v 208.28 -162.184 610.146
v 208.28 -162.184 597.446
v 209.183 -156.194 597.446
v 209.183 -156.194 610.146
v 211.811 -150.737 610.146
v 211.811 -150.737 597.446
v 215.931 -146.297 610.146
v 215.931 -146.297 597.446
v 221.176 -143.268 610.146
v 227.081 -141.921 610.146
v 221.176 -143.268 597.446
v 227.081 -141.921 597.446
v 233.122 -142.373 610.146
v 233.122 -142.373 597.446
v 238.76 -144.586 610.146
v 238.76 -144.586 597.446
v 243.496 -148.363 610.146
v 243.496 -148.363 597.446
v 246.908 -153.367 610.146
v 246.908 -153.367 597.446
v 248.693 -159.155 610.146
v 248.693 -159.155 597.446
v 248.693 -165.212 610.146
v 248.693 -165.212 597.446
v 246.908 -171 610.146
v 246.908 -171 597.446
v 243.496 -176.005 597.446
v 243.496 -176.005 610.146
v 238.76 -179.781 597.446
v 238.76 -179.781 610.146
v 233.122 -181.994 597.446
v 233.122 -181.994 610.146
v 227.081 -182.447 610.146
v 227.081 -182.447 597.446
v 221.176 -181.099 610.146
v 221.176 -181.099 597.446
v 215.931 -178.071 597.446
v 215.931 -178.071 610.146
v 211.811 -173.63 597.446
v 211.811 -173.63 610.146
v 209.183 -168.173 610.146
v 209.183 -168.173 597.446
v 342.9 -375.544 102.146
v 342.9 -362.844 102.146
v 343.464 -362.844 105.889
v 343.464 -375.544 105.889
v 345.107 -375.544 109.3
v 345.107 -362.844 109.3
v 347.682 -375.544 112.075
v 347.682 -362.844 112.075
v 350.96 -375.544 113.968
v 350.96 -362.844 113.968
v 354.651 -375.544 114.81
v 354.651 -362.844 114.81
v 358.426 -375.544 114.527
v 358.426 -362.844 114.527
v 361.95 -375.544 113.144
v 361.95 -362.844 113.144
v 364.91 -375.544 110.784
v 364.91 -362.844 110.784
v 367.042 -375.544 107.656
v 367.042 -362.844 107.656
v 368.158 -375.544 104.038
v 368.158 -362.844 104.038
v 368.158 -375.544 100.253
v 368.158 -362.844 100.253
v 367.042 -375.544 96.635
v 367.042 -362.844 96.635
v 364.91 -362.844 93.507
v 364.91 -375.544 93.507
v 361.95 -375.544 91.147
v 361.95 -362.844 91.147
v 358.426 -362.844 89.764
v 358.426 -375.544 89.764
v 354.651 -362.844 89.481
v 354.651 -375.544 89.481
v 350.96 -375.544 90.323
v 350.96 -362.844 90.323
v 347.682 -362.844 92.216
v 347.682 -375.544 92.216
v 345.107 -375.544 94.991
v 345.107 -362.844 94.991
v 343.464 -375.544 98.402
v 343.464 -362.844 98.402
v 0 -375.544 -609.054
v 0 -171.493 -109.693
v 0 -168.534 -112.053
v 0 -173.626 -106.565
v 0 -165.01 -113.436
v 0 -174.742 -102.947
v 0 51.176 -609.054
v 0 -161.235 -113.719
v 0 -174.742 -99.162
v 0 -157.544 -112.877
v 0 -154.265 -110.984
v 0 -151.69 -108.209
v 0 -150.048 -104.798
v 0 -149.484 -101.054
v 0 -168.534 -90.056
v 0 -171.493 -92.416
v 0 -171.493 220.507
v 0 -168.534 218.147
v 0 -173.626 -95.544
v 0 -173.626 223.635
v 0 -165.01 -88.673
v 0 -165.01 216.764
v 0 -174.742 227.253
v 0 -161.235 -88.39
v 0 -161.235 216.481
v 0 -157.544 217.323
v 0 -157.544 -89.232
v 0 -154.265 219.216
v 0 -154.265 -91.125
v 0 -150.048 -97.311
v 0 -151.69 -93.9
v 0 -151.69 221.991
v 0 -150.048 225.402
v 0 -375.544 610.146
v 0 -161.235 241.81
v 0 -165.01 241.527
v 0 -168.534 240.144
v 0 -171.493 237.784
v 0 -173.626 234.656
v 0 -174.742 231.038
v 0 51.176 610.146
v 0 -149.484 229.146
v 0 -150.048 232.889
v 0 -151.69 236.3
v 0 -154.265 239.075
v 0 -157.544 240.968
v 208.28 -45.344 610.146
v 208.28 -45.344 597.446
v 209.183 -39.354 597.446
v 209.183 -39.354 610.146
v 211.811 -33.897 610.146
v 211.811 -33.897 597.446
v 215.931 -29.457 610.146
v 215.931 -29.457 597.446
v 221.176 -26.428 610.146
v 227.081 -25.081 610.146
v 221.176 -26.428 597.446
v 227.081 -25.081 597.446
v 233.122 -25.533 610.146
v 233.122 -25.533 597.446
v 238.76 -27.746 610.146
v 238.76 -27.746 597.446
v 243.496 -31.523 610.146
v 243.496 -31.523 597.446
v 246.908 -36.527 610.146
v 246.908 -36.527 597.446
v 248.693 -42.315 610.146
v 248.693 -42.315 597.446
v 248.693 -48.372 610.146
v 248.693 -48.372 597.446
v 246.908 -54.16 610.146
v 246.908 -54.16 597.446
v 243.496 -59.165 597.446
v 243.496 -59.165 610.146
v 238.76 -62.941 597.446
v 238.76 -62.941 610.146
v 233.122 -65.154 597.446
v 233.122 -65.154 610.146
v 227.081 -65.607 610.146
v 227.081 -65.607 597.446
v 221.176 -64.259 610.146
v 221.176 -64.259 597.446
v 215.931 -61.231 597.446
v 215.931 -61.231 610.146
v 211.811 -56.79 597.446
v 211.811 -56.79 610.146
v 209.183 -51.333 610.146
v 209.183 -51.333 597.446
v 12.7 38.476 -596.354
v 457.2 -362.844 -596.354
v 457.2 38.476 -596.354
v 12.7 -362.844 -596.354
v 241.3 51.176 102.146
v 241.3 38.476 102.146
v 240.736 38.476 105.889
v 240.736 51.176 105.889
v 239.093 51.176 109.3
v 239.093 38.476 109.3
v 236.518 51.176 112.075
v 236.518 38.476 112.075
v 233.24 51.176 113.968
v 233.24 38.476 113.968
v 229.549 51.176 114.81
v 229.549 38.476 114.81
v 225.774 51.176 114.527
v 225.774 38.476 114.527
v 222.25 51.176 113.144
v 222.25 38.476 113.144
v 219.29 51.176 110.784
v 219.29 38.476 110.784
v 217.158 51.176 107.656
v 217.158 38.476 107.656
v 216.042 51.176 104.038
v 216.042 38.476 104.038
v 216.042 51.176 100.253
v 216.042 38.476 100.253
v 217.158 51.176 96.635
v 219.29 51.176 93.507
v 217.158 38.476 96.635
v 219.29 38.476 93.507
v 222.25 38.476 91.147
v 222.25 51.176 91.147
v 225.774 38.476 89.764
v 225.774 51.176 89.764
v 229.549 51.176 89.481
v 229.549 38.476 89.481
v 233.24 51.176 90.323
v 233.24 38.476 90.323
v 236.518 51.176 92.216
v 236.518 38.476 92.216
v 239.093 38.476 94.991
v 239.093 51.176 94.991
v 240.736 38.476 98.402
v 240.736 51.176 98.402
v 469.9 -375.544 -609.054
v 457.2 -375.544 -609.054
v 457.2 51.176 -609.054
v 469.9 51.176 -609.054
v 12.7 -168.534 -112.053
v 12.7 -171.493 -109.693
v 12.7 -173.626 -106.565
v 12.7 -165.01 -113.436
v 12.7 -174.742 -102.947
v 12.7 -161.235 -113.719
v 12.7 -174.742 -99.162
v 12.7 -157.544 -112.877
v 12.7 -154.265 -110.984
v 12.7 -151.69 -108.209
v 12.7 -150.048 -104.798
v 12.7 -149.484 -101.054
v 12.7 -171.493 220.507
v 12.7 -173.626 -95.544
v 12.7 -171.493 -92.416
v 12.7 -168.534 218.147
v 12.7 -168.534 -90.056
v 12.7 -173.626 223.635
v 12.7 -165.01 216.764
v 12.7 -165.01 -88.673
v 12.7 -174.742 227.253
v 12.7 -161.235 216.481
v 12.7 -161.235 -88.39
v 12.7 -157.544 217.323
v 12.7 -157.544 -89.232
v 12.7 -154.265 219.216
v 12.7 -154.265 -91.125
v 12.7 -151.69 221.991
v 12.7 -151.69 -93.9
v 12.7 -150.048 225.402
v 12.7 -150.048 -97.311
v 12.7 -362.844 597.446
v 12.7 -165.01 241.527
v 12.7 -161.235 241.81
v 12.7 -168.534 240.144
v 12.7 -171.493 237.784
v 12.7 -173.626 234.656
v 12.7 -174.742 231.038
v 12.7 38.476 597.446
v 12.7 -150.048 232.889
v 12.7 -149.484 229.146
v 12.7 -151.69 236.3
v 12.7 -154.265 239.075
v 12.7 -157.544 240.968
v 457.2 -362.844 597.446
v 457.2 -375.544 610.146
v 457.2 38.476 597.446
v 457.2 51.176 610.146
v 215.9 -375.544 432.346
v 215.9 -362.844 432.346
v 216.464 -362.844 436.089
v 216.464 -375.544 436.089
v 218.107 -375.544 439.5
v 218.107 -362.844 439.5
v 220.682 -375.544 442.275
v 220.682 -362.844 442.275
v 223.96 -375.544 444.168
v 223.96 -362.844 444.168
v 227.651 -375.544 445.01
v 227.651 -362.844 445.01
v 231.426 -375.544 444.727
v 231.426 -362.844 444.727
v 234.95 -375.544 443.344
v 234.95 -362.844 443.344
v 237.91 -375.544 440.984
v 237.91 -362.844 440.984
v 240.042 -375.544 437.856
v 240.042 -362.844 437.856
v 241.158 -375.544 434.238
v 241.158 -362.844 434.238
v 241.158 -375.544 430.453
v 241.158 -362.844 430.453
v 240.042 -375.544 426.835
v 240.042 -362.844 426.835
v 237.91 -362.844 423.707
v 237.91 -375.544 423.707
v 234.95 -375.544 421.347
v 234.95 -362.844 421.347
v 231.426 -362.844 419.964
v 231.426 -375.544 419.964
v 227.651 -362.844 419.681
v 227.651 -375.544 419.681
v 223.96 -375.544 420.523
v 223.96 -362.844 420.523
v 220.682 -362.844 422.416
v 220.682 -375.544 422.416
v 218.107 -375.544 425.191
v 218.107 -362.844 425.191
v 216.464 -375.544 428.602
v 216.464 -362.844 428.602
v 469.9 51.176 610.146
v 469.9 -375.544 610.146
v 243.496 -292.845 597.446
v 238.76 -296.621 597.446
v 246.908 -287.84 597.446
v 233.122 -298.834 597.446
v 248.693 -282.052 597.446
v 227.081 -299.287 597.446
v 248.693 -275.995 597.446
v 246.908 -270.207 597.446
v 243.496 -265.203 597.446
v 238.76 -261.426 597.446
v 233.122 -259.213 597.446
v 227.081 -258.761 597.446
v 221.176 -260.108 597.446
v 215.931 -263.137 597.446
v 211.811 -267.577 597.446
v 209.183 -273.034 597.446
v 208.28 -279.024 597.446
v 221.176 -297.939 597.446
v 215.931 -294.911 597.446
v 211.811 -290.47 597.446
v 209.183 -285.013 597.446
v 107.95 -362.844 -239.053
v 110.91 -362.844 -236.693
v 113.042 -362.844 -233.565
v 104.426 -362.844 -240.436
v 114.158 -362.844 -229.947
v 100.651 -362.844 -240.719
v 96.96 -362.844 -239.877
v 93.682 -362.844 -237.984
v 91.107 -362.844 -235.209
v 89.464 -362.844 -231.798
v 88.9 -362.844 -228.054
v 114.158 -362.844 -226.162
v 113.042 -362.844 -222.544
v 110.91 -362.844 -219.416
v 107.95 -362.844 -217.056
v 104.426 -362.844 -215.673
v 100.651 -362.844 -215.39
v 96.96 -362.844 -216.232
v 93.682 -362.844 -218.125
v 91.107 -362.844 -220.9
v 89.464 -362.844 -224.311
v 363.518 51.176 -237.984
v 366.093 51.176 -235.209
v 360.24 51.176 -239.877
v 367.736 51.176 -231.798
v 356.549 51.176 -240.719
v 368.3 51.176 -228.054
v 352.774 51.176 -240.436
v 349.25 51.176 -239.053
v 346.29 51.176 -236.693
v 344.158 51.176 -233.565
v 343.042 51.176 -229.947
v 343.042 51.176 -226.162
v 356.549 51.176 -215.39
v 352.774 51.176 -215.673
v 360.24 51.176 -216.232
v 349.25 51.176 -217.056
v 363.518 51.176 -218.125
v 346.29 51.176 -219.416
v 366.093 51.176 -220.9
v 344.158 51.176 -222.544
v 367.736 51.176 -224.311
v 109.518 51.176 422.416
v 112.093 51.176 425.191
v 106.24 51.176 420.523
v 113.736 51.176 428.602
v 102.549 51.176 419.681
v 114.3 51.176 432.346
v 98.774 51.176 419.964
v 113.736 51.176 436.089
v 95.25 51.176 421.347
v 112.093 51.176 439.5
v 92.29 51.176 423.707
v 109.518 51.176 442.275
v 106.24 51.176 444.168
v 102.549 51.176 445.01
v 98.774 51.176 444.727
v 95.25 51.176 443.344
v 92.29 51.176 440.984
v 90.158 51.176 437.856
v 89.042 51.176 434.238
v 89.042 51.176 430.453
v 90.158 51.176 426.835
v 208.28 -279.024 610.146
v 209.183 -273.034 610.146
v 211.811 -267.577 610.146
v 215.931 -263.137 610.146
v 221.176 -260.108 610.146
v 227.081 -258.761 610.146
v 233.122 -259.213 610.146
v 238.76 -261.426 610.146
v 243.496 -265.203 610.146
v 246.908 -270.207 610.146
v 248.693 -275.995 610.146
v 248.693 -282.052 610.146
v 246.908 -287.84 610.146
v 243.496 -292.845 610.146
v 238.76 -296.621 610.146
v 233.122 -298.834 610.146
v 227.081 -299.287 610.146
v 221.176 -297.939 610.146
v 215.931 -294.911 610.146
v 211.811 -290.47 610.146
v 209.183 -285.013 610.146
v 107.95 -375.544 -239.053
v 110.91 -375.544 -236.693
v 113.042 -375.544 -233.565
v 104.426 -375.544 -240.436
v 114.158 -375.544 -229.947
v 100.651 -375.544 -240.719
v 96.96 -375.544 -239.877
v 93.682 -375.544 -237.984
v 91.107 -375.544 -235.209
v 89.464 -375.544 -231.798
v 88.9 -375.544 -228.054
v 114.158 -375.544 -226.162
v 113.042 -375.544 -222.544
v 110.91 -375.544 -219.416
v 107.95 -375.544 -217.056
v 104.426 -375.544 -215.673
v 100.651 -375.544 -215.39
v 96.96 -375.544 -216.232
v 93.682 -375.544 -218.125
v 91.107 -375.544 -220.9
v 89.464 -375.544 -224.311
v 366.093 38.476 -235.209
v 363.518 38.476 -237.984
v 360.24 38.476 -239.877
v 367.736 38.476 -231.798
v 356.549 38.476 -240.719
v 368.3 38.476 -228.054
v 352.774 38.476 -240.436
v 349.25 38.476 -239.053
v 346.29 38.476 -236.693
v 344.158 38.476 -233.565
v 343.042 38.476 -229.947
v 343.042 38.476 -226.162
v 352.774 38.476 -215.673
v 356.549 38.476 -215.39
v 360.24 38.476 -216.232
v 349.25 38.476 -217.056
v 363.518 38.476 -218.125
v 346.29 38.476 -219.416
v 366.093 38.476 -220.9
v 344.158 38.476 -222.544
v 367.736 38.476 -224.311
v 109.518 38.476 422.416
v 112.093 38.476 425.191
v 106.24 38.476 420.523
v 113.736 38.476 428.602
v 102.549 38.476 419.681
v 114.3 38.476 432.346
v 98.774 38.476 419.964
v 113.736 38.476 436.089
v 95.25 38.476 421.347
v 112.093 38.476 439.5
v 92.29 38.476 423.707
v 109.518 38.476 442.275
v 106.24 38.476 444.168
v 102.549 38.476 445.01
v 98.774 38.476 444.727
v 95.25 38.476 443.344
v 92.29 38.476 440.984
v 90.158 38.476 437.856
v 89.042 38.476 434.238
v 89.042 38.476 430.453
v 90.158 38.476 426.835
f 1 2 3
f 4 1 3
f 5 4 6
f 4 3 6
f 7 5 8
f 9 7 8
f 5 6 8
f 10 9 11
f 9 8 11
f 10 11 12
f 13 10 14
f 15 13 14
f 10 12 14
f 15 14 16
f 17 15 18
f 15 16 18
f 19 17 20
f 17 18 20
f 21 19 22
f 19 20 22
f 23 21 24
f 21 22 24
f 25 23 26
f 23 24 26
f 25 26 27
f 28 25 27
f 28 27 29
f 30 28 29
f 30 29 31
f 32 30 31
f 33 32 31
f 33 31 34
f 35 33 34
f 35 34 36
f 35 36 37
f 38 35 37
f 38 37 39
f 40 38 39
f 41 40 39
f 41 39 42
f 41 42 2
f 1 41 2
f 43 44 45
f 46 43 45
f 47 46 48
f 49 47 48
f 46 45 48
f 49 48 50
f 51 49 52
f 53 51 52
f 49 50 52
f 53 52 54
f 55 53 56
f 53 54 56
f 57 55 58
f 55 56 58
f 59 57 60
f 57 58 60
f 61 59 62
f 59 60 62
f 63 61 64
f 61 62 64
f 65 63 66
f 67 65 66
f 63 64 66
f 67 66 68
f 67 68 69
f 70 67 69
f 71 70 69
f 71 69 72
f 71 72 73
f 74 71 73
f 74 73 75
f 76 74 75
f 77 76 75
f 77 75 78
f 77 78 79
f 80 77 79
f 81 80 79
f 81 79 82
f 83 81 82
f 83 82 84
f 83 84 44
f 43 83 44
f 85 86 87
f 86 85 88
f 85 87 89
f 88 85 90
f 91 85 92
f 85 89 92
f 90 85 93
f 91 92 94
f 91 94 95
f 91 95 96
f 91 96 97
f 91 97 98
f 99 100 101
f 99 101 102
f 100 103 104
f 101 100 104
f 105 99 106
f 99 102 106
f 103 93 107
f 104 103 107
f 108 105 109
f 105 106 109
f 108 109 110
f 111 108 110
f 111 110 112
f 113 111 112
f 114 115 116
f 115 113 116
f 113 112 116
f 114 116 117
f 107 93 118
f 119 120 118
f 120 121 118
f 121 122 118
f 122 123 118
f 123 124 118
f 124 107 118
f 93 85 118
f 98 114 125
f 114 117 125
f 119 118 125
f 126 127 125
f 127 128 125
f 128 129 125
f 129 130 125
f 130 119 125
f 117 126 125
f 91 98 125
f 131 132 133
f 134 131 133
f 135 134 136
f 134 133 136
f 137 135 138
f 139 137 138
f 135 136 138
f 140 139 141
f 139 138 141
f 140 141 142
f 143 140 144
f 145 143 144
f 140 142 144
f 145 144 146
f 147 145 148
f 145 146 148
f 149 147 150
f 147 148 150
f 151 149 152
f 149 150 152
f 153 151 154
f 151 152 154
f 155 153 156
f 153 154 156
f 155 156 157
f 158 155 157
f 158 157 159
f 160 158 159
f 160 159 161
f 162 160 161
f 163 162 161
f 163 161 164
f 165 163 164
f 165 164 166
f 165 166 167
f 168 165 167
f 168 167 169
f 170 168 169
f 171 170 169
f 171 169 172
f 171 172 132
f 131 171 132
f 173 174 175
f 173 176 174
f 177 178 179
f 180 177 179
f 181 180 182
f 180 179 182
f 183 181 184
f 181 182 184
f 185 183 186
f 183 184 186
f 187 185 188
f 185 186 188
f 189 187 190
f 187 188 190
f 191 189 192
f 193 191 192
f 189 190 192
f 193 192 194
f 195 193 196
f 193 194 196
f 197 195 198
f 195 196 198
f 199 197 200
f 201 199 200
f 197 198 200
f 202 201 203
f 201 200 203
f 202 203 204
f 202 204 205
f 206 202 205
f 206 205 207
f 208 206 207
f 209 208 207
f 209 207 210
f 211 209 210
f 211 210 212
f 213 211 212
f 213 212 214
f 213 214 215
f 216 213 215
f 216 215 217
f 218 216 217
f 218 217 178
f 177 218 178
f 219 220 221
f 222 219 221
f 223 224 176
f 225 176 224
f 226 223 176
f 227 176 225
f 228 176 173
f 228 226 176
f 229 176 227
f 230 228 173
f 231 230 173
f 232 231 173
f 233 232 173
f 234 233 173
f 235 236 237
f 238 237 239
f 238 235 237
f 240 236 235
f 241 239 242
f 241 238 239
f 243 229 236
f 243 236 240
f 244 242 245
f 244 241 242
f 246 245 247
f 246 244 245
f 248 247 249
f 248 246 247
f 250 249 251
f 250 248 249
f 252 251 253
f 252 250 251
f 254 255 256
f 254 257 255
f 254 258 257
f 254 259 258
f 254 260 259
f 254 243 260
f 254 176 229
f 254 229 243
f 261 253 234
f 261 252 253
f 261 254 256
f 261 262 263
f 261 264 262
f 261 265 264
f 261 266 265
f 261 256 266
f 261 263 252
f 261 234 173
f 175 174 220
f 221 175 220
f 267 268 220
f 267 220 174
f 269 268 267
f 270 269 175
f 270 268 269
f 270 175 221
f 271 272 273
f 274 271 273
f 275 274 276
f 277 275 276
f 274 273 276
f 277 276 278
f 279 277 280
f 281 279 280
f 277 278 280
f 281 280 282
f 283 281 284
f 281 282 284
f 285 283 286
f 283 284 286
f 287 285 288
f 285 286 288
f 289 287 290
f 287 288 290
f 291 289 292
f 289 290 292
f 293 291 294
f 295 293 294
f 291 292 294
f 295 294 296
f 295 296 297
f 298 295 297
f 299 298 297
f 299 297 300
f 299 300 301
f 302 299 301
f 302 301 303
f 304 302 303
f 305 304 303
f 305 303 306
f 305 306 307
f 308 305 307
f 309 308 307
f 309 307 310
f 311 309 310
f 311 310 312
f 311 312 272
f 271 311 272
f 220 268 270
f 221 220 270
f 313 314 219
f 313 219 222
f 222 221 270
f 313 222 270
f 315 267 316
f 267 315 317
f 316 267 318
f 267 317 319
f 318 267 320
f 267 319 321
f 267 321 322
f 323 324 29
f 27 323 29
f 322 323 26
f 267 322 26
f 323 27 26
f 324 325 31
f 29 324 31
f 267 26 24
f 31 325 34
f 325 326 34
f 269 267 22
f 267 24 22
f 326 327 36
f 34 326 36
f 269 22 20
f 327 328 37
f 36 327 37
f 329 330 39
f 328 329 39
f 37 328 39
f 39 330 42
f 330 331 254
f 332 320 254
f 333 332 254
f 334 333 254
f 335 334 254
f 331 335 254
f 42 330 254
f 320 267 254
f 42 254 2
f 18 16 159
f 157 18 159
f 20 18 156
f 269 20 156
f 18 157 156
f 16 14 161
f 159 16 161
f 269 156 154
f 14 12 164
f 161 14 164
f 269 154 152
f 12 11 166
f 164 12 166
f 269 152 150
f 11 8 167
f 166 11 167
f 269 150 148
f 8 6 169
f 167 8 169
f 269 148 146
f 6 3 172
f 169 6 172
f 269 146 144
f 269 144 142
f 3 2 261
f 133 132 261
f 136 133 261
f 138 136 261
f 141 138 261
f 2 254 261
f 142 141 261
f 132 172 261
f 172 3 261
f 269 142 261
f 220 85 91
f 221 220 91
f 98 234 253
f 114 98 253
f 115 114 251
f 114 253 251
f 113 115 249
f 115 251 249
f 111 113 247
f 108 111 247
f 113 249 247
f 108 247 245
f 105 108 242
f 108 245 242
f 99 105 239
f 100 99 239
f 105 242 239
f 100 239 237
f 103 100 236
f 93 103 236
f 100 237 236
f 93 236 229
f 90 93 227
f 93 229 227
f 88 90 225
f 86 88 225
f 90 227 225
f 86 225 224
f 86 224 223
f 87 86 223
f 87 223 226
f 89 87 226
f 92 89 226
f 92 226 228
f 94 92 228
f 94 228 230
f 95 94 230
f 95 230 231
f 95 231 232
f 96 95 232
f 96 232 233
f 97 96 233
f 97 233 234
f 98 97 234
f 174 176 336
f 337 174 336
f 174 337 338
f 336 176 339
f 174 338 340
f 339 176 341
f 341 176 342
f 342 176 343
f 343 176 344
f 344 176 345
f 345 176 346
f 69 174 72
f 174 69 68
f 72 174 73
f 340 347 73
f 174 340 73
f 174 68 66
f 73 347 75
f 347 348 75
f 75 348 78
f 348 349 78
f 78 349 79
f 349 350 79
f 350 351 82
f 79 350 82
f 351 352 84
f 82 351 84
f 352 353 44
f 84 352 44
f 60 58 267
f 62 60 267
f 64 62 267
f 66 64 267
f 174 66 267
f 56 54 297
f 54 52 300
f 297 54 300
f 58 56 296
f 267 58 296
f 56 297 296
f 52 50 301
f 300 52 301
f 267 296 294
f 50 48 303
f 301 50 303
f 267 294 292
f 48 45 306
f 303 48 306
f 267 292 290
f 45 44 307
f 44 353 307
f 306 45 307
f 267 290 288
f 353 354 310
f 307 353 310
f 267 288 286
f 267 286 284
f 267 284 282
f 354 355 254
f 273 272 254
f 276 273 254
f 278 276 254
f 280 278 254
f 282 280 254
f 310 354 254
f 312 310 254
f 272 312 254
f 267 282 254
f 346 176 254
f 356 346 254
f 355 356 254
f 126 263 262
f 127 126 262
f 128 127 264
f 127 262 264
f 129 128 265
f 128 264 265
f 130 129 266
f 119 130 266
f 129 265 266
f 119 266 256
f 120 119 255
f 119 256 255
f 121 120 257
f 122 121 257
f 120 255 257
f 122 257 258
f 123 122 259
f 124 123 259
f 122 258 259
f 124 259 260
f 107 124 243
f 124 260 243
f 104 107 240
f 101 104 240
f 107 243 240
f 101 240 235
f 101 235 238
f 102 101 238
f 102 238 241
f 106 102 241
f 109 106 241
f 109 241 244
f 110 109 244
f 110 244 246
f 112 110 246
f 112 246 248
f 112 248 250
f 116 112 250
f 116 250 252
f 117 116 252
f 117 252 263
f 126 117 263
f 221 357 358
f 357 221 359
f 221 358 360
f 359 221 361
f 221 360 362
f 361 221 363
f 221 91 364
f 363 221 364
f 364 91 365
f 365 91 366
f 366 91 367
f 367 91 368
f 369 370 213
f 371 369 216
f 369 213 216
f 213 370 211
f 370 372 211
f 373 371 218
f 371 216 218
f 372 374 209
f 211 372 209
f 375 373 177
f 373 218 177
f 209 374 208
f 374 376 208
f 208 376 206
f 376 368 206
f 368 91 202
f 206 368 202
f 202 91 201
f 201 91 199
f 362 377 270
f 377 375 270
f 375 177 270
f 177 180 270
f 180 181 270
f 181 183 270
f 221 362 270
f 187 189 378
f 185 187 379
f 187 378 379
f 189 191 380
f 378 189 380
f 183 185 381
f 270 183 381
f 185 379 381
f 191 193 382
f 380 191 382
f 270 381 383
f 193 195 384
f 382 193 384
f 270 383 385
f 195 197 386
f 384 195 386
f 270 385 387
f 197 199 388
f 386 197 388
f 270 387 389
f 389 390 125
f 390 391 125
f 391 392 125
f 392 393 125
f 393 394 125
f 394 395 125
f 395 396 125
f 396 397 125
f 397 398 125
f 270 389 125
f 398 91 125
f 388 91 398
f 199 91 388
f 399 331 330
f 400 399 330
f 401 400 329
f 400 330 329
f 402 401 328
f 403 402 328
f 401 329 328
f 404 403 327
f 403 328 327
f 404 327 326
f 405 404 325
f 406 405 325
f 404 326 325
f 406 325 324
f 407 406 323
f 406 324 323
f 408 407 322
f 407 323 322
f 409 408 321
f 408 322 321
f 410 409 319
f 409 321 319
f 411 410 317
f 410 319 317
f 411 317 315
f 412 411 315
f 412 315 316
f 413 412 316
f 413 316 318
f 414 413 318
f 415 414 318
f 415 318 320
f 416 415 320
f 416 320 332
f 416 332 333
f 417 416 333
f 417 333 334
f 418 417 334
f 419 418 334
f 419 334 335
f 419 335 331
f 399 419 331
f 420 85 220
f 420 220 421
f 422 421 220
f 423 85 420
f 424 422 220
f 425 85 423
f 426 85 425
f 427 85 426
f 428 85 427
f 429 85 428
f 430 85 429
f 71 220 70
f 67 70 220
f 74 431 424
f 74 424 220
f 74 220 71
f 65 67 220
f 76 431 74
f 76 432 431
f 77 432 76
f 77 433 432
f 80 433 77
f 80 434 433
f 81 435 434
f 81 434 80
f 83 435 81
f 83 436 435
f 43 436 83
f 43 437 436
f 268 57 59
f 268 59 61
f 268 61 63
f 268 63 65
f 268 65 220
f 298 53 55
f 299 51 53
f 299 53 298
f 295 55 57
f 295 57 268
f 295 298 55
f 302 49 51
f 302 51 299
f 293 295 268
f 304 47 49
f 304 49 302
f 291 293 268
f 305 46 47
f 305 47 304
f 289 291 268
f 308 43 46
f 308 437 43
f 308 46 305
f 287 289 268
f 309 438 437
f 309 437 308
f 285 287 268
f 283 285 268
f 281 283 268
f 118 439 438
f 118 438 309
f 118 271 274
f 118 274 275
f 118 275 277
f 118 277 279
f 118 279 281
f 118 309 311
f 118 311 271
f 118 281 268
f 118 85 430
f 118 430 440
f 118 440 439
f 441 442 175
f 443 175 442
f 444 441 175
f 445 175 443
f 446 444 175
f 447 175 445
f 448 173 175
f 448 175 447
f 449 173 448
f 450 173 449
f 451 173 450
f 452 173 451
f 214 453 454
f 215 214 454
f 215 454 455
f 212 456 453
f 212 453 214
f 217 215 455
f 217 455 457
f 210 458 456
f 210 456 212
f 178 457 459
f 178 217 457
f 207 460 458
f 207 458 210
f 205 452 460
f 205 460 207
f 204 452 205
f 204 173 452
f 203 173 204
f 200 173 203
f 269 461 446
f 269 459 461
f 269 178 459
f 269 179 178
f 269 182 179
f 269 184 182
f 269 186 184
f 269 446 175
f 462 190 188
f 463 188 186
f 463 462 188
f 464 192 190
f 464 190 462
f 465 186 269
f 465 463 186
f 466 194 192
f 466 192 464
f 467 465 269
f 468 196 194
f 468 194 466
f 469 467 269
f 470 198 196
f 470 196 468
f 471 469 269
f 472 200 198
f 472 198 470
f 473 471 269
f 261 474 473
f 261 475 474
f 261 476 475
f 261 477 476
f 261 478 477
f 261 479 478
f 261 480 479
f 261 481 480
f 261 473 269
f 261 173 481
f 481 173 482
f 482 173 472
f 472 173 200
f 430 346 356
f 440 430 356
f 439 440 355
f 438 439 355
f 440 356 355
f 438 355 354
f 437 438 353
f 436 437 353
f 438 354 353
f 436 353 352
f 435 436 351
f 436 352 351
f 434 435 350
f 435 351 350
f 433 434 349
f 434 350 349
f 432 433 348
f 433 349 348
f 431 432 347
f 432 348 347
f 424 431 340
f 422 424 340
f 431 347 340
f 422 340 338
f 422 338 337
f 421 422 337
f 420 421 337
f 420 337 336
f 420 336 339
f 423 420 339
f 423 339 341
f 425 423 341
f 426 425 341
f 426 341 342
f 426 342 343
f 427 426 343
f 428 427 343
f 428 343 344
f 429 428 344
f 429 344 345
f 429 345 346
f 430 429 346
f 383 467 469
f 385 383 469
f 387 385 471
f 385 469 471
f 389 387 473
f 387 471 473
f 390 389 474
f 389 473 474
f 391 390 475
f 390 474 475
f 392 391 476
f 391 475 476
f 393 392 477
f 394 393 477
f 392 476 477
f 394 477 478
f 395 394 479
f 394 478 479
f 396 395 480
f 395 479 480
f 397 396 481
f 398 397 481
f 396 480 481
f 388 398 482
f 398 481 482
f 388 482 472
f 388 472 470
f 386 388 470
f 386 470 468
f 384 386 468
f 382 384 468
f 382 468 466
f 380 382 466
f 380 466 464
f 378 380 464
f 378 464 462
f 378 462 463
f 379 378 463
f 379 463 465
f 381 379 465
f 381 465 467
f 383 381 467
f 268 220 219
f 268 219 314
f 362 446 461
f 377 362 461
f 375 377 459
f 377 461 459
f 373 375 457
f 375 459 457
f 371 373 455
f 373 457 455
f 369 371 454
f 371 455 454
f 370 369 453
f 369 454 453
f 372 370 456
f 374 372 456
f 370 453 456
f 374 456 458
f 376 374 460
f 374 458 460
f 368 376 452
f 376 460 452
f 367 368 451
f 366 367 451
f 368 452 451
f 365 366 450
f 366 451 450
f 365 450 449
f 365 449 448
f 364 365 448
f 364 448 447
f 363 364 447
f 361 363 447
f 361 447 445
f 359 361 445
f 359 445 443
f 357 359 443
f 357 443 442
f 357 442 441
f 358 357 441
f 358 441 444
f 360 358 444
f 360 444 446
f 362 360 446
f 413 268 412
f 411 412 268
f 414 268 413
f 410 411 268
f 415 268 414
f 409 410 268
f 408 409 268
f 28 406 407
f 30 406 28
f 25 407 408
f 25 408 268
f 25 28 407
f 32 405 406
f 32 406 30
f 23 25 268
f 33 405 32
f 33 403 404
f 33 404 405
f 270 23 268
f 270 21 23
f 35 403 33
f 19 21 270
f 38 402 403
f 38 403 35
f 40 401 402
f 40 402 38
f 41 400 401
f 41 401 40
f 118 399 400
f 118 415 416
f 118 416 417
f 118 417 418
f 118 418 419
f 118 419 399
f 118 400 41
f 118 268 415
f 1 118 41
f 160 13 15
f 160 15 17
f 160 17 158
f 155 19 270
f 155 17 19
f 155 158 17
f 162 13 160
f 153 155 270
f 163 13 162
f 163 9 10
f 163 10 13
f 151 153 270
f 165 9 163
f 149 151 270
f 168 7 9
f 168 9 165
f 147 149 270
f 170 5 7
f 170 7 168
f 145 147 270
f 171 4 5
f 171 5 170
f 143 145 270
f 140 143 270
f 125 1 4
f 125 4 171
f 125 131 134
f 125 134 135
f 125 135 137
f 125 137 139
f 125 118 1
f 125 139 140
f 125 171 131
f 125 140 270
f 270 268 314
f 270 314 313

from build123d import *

# Parameters (mm, degrees)
F0_W      = 426.72
F0_H      = 1219.2
F1_DEPTH  = 457.2
F2_T      = -12.7
F4_D      = 40.64
F4_DEPTH  = 12.7
F5_D      = 40.64
F5_DEPTH  = 12.7
F6_D      = 40.64
F6_DEPTH  = 12.7
F7_W      = 426.72
F7_H      = 1219.2
F8_DEPTH  = 12.7
F10_D     = 25.4
F10_DEPTH = 12.7
F11_D     = 25.4
F11_DEPTH = 12.7
F13_D     = 25.4
F13_DEPTH = 12.7
F15_D     = 25.4
F15_DEPTH = 12.7


with BuildPart() as f1:
    # F0 (on Right) → F1 (new body)
    with BuildSketch(Plane.YZ):
        with Locations((-162.183705, 0.54552)):
            Rectangle(F0_W, F0_H)
    extrude(amount=F1_DEPTH)

    # F2
    f2_openings = [f1.faces().sort_by_distance(p)[0] for p in [
        (457.2, -162.183705, 0.54552),
    ]]
    offset(amount=F2_T, openings=f2_openings)

    # F4
    with Locations(Plane.XY.offset(610.14552)):
        with Locations((228.6, -162.183705)):
            Hole(F4_D / 2, depth=F4_DEPTH)

    # F5
    with Locations(Plane.XY.offset(610.14552)):
        with Locations((228.6, -45.343705)):
            Hole(F5_D / 2, depth=F5_DEPTH)

    # F6
    with Locations(Plane.XY.offset(610.14552)):
        with Locations((228.6, -279.023705)):
            Hole(F6_D / 2, depth=F6_DEPTH)

    # F10
    with Locations(Plane.XZ.offset(375.543705)):
        with Locations((101.6, -228.05448)):
            Hole(F10_D / 2, depth=F10_DEPTH)

    # F11
    with Locations(Plane.XZ.offset(375.543705)):
        with Locations((228.6, 432.34552), (355.6, 102.14552)):
            Hole(F11_D / 2, depth=F11_DEPTH)

    # F13
    with Locations(Plane(origin=(0, 0, 0), x_dir=(0, -1, 0), z_dir=(-1, 0, 0))):
        with Locations((162.183705, 229.14552), (162.183705, -101.05448)):
            Hole(F13_D / 2, depth=F13_DEPTH)

    # F15
    with Locations(Plane(origin=(0, 51.176295, 0), x_dir=(-1, 0, 0), z_dir=(0, 1, 0))):
        with Locations((-101.6, 432.34552), (-228.6, 102.14552), (-355.6, -228.05448)):
            Hole(F15_D / 2, depth=F15_DEPTH)


with BuildPart() as f8:
    # F7 (on face) → F8 (new body)
    with BuildSketch(Plane.YZ.offset(457.2)):
        with Locations((-162.183705, 0.54552)):
            Rectangle(F7_W, F7_H)
    extrude(amount=F8_DEPTH)


solid = Compound([f1.part, f8.part])
